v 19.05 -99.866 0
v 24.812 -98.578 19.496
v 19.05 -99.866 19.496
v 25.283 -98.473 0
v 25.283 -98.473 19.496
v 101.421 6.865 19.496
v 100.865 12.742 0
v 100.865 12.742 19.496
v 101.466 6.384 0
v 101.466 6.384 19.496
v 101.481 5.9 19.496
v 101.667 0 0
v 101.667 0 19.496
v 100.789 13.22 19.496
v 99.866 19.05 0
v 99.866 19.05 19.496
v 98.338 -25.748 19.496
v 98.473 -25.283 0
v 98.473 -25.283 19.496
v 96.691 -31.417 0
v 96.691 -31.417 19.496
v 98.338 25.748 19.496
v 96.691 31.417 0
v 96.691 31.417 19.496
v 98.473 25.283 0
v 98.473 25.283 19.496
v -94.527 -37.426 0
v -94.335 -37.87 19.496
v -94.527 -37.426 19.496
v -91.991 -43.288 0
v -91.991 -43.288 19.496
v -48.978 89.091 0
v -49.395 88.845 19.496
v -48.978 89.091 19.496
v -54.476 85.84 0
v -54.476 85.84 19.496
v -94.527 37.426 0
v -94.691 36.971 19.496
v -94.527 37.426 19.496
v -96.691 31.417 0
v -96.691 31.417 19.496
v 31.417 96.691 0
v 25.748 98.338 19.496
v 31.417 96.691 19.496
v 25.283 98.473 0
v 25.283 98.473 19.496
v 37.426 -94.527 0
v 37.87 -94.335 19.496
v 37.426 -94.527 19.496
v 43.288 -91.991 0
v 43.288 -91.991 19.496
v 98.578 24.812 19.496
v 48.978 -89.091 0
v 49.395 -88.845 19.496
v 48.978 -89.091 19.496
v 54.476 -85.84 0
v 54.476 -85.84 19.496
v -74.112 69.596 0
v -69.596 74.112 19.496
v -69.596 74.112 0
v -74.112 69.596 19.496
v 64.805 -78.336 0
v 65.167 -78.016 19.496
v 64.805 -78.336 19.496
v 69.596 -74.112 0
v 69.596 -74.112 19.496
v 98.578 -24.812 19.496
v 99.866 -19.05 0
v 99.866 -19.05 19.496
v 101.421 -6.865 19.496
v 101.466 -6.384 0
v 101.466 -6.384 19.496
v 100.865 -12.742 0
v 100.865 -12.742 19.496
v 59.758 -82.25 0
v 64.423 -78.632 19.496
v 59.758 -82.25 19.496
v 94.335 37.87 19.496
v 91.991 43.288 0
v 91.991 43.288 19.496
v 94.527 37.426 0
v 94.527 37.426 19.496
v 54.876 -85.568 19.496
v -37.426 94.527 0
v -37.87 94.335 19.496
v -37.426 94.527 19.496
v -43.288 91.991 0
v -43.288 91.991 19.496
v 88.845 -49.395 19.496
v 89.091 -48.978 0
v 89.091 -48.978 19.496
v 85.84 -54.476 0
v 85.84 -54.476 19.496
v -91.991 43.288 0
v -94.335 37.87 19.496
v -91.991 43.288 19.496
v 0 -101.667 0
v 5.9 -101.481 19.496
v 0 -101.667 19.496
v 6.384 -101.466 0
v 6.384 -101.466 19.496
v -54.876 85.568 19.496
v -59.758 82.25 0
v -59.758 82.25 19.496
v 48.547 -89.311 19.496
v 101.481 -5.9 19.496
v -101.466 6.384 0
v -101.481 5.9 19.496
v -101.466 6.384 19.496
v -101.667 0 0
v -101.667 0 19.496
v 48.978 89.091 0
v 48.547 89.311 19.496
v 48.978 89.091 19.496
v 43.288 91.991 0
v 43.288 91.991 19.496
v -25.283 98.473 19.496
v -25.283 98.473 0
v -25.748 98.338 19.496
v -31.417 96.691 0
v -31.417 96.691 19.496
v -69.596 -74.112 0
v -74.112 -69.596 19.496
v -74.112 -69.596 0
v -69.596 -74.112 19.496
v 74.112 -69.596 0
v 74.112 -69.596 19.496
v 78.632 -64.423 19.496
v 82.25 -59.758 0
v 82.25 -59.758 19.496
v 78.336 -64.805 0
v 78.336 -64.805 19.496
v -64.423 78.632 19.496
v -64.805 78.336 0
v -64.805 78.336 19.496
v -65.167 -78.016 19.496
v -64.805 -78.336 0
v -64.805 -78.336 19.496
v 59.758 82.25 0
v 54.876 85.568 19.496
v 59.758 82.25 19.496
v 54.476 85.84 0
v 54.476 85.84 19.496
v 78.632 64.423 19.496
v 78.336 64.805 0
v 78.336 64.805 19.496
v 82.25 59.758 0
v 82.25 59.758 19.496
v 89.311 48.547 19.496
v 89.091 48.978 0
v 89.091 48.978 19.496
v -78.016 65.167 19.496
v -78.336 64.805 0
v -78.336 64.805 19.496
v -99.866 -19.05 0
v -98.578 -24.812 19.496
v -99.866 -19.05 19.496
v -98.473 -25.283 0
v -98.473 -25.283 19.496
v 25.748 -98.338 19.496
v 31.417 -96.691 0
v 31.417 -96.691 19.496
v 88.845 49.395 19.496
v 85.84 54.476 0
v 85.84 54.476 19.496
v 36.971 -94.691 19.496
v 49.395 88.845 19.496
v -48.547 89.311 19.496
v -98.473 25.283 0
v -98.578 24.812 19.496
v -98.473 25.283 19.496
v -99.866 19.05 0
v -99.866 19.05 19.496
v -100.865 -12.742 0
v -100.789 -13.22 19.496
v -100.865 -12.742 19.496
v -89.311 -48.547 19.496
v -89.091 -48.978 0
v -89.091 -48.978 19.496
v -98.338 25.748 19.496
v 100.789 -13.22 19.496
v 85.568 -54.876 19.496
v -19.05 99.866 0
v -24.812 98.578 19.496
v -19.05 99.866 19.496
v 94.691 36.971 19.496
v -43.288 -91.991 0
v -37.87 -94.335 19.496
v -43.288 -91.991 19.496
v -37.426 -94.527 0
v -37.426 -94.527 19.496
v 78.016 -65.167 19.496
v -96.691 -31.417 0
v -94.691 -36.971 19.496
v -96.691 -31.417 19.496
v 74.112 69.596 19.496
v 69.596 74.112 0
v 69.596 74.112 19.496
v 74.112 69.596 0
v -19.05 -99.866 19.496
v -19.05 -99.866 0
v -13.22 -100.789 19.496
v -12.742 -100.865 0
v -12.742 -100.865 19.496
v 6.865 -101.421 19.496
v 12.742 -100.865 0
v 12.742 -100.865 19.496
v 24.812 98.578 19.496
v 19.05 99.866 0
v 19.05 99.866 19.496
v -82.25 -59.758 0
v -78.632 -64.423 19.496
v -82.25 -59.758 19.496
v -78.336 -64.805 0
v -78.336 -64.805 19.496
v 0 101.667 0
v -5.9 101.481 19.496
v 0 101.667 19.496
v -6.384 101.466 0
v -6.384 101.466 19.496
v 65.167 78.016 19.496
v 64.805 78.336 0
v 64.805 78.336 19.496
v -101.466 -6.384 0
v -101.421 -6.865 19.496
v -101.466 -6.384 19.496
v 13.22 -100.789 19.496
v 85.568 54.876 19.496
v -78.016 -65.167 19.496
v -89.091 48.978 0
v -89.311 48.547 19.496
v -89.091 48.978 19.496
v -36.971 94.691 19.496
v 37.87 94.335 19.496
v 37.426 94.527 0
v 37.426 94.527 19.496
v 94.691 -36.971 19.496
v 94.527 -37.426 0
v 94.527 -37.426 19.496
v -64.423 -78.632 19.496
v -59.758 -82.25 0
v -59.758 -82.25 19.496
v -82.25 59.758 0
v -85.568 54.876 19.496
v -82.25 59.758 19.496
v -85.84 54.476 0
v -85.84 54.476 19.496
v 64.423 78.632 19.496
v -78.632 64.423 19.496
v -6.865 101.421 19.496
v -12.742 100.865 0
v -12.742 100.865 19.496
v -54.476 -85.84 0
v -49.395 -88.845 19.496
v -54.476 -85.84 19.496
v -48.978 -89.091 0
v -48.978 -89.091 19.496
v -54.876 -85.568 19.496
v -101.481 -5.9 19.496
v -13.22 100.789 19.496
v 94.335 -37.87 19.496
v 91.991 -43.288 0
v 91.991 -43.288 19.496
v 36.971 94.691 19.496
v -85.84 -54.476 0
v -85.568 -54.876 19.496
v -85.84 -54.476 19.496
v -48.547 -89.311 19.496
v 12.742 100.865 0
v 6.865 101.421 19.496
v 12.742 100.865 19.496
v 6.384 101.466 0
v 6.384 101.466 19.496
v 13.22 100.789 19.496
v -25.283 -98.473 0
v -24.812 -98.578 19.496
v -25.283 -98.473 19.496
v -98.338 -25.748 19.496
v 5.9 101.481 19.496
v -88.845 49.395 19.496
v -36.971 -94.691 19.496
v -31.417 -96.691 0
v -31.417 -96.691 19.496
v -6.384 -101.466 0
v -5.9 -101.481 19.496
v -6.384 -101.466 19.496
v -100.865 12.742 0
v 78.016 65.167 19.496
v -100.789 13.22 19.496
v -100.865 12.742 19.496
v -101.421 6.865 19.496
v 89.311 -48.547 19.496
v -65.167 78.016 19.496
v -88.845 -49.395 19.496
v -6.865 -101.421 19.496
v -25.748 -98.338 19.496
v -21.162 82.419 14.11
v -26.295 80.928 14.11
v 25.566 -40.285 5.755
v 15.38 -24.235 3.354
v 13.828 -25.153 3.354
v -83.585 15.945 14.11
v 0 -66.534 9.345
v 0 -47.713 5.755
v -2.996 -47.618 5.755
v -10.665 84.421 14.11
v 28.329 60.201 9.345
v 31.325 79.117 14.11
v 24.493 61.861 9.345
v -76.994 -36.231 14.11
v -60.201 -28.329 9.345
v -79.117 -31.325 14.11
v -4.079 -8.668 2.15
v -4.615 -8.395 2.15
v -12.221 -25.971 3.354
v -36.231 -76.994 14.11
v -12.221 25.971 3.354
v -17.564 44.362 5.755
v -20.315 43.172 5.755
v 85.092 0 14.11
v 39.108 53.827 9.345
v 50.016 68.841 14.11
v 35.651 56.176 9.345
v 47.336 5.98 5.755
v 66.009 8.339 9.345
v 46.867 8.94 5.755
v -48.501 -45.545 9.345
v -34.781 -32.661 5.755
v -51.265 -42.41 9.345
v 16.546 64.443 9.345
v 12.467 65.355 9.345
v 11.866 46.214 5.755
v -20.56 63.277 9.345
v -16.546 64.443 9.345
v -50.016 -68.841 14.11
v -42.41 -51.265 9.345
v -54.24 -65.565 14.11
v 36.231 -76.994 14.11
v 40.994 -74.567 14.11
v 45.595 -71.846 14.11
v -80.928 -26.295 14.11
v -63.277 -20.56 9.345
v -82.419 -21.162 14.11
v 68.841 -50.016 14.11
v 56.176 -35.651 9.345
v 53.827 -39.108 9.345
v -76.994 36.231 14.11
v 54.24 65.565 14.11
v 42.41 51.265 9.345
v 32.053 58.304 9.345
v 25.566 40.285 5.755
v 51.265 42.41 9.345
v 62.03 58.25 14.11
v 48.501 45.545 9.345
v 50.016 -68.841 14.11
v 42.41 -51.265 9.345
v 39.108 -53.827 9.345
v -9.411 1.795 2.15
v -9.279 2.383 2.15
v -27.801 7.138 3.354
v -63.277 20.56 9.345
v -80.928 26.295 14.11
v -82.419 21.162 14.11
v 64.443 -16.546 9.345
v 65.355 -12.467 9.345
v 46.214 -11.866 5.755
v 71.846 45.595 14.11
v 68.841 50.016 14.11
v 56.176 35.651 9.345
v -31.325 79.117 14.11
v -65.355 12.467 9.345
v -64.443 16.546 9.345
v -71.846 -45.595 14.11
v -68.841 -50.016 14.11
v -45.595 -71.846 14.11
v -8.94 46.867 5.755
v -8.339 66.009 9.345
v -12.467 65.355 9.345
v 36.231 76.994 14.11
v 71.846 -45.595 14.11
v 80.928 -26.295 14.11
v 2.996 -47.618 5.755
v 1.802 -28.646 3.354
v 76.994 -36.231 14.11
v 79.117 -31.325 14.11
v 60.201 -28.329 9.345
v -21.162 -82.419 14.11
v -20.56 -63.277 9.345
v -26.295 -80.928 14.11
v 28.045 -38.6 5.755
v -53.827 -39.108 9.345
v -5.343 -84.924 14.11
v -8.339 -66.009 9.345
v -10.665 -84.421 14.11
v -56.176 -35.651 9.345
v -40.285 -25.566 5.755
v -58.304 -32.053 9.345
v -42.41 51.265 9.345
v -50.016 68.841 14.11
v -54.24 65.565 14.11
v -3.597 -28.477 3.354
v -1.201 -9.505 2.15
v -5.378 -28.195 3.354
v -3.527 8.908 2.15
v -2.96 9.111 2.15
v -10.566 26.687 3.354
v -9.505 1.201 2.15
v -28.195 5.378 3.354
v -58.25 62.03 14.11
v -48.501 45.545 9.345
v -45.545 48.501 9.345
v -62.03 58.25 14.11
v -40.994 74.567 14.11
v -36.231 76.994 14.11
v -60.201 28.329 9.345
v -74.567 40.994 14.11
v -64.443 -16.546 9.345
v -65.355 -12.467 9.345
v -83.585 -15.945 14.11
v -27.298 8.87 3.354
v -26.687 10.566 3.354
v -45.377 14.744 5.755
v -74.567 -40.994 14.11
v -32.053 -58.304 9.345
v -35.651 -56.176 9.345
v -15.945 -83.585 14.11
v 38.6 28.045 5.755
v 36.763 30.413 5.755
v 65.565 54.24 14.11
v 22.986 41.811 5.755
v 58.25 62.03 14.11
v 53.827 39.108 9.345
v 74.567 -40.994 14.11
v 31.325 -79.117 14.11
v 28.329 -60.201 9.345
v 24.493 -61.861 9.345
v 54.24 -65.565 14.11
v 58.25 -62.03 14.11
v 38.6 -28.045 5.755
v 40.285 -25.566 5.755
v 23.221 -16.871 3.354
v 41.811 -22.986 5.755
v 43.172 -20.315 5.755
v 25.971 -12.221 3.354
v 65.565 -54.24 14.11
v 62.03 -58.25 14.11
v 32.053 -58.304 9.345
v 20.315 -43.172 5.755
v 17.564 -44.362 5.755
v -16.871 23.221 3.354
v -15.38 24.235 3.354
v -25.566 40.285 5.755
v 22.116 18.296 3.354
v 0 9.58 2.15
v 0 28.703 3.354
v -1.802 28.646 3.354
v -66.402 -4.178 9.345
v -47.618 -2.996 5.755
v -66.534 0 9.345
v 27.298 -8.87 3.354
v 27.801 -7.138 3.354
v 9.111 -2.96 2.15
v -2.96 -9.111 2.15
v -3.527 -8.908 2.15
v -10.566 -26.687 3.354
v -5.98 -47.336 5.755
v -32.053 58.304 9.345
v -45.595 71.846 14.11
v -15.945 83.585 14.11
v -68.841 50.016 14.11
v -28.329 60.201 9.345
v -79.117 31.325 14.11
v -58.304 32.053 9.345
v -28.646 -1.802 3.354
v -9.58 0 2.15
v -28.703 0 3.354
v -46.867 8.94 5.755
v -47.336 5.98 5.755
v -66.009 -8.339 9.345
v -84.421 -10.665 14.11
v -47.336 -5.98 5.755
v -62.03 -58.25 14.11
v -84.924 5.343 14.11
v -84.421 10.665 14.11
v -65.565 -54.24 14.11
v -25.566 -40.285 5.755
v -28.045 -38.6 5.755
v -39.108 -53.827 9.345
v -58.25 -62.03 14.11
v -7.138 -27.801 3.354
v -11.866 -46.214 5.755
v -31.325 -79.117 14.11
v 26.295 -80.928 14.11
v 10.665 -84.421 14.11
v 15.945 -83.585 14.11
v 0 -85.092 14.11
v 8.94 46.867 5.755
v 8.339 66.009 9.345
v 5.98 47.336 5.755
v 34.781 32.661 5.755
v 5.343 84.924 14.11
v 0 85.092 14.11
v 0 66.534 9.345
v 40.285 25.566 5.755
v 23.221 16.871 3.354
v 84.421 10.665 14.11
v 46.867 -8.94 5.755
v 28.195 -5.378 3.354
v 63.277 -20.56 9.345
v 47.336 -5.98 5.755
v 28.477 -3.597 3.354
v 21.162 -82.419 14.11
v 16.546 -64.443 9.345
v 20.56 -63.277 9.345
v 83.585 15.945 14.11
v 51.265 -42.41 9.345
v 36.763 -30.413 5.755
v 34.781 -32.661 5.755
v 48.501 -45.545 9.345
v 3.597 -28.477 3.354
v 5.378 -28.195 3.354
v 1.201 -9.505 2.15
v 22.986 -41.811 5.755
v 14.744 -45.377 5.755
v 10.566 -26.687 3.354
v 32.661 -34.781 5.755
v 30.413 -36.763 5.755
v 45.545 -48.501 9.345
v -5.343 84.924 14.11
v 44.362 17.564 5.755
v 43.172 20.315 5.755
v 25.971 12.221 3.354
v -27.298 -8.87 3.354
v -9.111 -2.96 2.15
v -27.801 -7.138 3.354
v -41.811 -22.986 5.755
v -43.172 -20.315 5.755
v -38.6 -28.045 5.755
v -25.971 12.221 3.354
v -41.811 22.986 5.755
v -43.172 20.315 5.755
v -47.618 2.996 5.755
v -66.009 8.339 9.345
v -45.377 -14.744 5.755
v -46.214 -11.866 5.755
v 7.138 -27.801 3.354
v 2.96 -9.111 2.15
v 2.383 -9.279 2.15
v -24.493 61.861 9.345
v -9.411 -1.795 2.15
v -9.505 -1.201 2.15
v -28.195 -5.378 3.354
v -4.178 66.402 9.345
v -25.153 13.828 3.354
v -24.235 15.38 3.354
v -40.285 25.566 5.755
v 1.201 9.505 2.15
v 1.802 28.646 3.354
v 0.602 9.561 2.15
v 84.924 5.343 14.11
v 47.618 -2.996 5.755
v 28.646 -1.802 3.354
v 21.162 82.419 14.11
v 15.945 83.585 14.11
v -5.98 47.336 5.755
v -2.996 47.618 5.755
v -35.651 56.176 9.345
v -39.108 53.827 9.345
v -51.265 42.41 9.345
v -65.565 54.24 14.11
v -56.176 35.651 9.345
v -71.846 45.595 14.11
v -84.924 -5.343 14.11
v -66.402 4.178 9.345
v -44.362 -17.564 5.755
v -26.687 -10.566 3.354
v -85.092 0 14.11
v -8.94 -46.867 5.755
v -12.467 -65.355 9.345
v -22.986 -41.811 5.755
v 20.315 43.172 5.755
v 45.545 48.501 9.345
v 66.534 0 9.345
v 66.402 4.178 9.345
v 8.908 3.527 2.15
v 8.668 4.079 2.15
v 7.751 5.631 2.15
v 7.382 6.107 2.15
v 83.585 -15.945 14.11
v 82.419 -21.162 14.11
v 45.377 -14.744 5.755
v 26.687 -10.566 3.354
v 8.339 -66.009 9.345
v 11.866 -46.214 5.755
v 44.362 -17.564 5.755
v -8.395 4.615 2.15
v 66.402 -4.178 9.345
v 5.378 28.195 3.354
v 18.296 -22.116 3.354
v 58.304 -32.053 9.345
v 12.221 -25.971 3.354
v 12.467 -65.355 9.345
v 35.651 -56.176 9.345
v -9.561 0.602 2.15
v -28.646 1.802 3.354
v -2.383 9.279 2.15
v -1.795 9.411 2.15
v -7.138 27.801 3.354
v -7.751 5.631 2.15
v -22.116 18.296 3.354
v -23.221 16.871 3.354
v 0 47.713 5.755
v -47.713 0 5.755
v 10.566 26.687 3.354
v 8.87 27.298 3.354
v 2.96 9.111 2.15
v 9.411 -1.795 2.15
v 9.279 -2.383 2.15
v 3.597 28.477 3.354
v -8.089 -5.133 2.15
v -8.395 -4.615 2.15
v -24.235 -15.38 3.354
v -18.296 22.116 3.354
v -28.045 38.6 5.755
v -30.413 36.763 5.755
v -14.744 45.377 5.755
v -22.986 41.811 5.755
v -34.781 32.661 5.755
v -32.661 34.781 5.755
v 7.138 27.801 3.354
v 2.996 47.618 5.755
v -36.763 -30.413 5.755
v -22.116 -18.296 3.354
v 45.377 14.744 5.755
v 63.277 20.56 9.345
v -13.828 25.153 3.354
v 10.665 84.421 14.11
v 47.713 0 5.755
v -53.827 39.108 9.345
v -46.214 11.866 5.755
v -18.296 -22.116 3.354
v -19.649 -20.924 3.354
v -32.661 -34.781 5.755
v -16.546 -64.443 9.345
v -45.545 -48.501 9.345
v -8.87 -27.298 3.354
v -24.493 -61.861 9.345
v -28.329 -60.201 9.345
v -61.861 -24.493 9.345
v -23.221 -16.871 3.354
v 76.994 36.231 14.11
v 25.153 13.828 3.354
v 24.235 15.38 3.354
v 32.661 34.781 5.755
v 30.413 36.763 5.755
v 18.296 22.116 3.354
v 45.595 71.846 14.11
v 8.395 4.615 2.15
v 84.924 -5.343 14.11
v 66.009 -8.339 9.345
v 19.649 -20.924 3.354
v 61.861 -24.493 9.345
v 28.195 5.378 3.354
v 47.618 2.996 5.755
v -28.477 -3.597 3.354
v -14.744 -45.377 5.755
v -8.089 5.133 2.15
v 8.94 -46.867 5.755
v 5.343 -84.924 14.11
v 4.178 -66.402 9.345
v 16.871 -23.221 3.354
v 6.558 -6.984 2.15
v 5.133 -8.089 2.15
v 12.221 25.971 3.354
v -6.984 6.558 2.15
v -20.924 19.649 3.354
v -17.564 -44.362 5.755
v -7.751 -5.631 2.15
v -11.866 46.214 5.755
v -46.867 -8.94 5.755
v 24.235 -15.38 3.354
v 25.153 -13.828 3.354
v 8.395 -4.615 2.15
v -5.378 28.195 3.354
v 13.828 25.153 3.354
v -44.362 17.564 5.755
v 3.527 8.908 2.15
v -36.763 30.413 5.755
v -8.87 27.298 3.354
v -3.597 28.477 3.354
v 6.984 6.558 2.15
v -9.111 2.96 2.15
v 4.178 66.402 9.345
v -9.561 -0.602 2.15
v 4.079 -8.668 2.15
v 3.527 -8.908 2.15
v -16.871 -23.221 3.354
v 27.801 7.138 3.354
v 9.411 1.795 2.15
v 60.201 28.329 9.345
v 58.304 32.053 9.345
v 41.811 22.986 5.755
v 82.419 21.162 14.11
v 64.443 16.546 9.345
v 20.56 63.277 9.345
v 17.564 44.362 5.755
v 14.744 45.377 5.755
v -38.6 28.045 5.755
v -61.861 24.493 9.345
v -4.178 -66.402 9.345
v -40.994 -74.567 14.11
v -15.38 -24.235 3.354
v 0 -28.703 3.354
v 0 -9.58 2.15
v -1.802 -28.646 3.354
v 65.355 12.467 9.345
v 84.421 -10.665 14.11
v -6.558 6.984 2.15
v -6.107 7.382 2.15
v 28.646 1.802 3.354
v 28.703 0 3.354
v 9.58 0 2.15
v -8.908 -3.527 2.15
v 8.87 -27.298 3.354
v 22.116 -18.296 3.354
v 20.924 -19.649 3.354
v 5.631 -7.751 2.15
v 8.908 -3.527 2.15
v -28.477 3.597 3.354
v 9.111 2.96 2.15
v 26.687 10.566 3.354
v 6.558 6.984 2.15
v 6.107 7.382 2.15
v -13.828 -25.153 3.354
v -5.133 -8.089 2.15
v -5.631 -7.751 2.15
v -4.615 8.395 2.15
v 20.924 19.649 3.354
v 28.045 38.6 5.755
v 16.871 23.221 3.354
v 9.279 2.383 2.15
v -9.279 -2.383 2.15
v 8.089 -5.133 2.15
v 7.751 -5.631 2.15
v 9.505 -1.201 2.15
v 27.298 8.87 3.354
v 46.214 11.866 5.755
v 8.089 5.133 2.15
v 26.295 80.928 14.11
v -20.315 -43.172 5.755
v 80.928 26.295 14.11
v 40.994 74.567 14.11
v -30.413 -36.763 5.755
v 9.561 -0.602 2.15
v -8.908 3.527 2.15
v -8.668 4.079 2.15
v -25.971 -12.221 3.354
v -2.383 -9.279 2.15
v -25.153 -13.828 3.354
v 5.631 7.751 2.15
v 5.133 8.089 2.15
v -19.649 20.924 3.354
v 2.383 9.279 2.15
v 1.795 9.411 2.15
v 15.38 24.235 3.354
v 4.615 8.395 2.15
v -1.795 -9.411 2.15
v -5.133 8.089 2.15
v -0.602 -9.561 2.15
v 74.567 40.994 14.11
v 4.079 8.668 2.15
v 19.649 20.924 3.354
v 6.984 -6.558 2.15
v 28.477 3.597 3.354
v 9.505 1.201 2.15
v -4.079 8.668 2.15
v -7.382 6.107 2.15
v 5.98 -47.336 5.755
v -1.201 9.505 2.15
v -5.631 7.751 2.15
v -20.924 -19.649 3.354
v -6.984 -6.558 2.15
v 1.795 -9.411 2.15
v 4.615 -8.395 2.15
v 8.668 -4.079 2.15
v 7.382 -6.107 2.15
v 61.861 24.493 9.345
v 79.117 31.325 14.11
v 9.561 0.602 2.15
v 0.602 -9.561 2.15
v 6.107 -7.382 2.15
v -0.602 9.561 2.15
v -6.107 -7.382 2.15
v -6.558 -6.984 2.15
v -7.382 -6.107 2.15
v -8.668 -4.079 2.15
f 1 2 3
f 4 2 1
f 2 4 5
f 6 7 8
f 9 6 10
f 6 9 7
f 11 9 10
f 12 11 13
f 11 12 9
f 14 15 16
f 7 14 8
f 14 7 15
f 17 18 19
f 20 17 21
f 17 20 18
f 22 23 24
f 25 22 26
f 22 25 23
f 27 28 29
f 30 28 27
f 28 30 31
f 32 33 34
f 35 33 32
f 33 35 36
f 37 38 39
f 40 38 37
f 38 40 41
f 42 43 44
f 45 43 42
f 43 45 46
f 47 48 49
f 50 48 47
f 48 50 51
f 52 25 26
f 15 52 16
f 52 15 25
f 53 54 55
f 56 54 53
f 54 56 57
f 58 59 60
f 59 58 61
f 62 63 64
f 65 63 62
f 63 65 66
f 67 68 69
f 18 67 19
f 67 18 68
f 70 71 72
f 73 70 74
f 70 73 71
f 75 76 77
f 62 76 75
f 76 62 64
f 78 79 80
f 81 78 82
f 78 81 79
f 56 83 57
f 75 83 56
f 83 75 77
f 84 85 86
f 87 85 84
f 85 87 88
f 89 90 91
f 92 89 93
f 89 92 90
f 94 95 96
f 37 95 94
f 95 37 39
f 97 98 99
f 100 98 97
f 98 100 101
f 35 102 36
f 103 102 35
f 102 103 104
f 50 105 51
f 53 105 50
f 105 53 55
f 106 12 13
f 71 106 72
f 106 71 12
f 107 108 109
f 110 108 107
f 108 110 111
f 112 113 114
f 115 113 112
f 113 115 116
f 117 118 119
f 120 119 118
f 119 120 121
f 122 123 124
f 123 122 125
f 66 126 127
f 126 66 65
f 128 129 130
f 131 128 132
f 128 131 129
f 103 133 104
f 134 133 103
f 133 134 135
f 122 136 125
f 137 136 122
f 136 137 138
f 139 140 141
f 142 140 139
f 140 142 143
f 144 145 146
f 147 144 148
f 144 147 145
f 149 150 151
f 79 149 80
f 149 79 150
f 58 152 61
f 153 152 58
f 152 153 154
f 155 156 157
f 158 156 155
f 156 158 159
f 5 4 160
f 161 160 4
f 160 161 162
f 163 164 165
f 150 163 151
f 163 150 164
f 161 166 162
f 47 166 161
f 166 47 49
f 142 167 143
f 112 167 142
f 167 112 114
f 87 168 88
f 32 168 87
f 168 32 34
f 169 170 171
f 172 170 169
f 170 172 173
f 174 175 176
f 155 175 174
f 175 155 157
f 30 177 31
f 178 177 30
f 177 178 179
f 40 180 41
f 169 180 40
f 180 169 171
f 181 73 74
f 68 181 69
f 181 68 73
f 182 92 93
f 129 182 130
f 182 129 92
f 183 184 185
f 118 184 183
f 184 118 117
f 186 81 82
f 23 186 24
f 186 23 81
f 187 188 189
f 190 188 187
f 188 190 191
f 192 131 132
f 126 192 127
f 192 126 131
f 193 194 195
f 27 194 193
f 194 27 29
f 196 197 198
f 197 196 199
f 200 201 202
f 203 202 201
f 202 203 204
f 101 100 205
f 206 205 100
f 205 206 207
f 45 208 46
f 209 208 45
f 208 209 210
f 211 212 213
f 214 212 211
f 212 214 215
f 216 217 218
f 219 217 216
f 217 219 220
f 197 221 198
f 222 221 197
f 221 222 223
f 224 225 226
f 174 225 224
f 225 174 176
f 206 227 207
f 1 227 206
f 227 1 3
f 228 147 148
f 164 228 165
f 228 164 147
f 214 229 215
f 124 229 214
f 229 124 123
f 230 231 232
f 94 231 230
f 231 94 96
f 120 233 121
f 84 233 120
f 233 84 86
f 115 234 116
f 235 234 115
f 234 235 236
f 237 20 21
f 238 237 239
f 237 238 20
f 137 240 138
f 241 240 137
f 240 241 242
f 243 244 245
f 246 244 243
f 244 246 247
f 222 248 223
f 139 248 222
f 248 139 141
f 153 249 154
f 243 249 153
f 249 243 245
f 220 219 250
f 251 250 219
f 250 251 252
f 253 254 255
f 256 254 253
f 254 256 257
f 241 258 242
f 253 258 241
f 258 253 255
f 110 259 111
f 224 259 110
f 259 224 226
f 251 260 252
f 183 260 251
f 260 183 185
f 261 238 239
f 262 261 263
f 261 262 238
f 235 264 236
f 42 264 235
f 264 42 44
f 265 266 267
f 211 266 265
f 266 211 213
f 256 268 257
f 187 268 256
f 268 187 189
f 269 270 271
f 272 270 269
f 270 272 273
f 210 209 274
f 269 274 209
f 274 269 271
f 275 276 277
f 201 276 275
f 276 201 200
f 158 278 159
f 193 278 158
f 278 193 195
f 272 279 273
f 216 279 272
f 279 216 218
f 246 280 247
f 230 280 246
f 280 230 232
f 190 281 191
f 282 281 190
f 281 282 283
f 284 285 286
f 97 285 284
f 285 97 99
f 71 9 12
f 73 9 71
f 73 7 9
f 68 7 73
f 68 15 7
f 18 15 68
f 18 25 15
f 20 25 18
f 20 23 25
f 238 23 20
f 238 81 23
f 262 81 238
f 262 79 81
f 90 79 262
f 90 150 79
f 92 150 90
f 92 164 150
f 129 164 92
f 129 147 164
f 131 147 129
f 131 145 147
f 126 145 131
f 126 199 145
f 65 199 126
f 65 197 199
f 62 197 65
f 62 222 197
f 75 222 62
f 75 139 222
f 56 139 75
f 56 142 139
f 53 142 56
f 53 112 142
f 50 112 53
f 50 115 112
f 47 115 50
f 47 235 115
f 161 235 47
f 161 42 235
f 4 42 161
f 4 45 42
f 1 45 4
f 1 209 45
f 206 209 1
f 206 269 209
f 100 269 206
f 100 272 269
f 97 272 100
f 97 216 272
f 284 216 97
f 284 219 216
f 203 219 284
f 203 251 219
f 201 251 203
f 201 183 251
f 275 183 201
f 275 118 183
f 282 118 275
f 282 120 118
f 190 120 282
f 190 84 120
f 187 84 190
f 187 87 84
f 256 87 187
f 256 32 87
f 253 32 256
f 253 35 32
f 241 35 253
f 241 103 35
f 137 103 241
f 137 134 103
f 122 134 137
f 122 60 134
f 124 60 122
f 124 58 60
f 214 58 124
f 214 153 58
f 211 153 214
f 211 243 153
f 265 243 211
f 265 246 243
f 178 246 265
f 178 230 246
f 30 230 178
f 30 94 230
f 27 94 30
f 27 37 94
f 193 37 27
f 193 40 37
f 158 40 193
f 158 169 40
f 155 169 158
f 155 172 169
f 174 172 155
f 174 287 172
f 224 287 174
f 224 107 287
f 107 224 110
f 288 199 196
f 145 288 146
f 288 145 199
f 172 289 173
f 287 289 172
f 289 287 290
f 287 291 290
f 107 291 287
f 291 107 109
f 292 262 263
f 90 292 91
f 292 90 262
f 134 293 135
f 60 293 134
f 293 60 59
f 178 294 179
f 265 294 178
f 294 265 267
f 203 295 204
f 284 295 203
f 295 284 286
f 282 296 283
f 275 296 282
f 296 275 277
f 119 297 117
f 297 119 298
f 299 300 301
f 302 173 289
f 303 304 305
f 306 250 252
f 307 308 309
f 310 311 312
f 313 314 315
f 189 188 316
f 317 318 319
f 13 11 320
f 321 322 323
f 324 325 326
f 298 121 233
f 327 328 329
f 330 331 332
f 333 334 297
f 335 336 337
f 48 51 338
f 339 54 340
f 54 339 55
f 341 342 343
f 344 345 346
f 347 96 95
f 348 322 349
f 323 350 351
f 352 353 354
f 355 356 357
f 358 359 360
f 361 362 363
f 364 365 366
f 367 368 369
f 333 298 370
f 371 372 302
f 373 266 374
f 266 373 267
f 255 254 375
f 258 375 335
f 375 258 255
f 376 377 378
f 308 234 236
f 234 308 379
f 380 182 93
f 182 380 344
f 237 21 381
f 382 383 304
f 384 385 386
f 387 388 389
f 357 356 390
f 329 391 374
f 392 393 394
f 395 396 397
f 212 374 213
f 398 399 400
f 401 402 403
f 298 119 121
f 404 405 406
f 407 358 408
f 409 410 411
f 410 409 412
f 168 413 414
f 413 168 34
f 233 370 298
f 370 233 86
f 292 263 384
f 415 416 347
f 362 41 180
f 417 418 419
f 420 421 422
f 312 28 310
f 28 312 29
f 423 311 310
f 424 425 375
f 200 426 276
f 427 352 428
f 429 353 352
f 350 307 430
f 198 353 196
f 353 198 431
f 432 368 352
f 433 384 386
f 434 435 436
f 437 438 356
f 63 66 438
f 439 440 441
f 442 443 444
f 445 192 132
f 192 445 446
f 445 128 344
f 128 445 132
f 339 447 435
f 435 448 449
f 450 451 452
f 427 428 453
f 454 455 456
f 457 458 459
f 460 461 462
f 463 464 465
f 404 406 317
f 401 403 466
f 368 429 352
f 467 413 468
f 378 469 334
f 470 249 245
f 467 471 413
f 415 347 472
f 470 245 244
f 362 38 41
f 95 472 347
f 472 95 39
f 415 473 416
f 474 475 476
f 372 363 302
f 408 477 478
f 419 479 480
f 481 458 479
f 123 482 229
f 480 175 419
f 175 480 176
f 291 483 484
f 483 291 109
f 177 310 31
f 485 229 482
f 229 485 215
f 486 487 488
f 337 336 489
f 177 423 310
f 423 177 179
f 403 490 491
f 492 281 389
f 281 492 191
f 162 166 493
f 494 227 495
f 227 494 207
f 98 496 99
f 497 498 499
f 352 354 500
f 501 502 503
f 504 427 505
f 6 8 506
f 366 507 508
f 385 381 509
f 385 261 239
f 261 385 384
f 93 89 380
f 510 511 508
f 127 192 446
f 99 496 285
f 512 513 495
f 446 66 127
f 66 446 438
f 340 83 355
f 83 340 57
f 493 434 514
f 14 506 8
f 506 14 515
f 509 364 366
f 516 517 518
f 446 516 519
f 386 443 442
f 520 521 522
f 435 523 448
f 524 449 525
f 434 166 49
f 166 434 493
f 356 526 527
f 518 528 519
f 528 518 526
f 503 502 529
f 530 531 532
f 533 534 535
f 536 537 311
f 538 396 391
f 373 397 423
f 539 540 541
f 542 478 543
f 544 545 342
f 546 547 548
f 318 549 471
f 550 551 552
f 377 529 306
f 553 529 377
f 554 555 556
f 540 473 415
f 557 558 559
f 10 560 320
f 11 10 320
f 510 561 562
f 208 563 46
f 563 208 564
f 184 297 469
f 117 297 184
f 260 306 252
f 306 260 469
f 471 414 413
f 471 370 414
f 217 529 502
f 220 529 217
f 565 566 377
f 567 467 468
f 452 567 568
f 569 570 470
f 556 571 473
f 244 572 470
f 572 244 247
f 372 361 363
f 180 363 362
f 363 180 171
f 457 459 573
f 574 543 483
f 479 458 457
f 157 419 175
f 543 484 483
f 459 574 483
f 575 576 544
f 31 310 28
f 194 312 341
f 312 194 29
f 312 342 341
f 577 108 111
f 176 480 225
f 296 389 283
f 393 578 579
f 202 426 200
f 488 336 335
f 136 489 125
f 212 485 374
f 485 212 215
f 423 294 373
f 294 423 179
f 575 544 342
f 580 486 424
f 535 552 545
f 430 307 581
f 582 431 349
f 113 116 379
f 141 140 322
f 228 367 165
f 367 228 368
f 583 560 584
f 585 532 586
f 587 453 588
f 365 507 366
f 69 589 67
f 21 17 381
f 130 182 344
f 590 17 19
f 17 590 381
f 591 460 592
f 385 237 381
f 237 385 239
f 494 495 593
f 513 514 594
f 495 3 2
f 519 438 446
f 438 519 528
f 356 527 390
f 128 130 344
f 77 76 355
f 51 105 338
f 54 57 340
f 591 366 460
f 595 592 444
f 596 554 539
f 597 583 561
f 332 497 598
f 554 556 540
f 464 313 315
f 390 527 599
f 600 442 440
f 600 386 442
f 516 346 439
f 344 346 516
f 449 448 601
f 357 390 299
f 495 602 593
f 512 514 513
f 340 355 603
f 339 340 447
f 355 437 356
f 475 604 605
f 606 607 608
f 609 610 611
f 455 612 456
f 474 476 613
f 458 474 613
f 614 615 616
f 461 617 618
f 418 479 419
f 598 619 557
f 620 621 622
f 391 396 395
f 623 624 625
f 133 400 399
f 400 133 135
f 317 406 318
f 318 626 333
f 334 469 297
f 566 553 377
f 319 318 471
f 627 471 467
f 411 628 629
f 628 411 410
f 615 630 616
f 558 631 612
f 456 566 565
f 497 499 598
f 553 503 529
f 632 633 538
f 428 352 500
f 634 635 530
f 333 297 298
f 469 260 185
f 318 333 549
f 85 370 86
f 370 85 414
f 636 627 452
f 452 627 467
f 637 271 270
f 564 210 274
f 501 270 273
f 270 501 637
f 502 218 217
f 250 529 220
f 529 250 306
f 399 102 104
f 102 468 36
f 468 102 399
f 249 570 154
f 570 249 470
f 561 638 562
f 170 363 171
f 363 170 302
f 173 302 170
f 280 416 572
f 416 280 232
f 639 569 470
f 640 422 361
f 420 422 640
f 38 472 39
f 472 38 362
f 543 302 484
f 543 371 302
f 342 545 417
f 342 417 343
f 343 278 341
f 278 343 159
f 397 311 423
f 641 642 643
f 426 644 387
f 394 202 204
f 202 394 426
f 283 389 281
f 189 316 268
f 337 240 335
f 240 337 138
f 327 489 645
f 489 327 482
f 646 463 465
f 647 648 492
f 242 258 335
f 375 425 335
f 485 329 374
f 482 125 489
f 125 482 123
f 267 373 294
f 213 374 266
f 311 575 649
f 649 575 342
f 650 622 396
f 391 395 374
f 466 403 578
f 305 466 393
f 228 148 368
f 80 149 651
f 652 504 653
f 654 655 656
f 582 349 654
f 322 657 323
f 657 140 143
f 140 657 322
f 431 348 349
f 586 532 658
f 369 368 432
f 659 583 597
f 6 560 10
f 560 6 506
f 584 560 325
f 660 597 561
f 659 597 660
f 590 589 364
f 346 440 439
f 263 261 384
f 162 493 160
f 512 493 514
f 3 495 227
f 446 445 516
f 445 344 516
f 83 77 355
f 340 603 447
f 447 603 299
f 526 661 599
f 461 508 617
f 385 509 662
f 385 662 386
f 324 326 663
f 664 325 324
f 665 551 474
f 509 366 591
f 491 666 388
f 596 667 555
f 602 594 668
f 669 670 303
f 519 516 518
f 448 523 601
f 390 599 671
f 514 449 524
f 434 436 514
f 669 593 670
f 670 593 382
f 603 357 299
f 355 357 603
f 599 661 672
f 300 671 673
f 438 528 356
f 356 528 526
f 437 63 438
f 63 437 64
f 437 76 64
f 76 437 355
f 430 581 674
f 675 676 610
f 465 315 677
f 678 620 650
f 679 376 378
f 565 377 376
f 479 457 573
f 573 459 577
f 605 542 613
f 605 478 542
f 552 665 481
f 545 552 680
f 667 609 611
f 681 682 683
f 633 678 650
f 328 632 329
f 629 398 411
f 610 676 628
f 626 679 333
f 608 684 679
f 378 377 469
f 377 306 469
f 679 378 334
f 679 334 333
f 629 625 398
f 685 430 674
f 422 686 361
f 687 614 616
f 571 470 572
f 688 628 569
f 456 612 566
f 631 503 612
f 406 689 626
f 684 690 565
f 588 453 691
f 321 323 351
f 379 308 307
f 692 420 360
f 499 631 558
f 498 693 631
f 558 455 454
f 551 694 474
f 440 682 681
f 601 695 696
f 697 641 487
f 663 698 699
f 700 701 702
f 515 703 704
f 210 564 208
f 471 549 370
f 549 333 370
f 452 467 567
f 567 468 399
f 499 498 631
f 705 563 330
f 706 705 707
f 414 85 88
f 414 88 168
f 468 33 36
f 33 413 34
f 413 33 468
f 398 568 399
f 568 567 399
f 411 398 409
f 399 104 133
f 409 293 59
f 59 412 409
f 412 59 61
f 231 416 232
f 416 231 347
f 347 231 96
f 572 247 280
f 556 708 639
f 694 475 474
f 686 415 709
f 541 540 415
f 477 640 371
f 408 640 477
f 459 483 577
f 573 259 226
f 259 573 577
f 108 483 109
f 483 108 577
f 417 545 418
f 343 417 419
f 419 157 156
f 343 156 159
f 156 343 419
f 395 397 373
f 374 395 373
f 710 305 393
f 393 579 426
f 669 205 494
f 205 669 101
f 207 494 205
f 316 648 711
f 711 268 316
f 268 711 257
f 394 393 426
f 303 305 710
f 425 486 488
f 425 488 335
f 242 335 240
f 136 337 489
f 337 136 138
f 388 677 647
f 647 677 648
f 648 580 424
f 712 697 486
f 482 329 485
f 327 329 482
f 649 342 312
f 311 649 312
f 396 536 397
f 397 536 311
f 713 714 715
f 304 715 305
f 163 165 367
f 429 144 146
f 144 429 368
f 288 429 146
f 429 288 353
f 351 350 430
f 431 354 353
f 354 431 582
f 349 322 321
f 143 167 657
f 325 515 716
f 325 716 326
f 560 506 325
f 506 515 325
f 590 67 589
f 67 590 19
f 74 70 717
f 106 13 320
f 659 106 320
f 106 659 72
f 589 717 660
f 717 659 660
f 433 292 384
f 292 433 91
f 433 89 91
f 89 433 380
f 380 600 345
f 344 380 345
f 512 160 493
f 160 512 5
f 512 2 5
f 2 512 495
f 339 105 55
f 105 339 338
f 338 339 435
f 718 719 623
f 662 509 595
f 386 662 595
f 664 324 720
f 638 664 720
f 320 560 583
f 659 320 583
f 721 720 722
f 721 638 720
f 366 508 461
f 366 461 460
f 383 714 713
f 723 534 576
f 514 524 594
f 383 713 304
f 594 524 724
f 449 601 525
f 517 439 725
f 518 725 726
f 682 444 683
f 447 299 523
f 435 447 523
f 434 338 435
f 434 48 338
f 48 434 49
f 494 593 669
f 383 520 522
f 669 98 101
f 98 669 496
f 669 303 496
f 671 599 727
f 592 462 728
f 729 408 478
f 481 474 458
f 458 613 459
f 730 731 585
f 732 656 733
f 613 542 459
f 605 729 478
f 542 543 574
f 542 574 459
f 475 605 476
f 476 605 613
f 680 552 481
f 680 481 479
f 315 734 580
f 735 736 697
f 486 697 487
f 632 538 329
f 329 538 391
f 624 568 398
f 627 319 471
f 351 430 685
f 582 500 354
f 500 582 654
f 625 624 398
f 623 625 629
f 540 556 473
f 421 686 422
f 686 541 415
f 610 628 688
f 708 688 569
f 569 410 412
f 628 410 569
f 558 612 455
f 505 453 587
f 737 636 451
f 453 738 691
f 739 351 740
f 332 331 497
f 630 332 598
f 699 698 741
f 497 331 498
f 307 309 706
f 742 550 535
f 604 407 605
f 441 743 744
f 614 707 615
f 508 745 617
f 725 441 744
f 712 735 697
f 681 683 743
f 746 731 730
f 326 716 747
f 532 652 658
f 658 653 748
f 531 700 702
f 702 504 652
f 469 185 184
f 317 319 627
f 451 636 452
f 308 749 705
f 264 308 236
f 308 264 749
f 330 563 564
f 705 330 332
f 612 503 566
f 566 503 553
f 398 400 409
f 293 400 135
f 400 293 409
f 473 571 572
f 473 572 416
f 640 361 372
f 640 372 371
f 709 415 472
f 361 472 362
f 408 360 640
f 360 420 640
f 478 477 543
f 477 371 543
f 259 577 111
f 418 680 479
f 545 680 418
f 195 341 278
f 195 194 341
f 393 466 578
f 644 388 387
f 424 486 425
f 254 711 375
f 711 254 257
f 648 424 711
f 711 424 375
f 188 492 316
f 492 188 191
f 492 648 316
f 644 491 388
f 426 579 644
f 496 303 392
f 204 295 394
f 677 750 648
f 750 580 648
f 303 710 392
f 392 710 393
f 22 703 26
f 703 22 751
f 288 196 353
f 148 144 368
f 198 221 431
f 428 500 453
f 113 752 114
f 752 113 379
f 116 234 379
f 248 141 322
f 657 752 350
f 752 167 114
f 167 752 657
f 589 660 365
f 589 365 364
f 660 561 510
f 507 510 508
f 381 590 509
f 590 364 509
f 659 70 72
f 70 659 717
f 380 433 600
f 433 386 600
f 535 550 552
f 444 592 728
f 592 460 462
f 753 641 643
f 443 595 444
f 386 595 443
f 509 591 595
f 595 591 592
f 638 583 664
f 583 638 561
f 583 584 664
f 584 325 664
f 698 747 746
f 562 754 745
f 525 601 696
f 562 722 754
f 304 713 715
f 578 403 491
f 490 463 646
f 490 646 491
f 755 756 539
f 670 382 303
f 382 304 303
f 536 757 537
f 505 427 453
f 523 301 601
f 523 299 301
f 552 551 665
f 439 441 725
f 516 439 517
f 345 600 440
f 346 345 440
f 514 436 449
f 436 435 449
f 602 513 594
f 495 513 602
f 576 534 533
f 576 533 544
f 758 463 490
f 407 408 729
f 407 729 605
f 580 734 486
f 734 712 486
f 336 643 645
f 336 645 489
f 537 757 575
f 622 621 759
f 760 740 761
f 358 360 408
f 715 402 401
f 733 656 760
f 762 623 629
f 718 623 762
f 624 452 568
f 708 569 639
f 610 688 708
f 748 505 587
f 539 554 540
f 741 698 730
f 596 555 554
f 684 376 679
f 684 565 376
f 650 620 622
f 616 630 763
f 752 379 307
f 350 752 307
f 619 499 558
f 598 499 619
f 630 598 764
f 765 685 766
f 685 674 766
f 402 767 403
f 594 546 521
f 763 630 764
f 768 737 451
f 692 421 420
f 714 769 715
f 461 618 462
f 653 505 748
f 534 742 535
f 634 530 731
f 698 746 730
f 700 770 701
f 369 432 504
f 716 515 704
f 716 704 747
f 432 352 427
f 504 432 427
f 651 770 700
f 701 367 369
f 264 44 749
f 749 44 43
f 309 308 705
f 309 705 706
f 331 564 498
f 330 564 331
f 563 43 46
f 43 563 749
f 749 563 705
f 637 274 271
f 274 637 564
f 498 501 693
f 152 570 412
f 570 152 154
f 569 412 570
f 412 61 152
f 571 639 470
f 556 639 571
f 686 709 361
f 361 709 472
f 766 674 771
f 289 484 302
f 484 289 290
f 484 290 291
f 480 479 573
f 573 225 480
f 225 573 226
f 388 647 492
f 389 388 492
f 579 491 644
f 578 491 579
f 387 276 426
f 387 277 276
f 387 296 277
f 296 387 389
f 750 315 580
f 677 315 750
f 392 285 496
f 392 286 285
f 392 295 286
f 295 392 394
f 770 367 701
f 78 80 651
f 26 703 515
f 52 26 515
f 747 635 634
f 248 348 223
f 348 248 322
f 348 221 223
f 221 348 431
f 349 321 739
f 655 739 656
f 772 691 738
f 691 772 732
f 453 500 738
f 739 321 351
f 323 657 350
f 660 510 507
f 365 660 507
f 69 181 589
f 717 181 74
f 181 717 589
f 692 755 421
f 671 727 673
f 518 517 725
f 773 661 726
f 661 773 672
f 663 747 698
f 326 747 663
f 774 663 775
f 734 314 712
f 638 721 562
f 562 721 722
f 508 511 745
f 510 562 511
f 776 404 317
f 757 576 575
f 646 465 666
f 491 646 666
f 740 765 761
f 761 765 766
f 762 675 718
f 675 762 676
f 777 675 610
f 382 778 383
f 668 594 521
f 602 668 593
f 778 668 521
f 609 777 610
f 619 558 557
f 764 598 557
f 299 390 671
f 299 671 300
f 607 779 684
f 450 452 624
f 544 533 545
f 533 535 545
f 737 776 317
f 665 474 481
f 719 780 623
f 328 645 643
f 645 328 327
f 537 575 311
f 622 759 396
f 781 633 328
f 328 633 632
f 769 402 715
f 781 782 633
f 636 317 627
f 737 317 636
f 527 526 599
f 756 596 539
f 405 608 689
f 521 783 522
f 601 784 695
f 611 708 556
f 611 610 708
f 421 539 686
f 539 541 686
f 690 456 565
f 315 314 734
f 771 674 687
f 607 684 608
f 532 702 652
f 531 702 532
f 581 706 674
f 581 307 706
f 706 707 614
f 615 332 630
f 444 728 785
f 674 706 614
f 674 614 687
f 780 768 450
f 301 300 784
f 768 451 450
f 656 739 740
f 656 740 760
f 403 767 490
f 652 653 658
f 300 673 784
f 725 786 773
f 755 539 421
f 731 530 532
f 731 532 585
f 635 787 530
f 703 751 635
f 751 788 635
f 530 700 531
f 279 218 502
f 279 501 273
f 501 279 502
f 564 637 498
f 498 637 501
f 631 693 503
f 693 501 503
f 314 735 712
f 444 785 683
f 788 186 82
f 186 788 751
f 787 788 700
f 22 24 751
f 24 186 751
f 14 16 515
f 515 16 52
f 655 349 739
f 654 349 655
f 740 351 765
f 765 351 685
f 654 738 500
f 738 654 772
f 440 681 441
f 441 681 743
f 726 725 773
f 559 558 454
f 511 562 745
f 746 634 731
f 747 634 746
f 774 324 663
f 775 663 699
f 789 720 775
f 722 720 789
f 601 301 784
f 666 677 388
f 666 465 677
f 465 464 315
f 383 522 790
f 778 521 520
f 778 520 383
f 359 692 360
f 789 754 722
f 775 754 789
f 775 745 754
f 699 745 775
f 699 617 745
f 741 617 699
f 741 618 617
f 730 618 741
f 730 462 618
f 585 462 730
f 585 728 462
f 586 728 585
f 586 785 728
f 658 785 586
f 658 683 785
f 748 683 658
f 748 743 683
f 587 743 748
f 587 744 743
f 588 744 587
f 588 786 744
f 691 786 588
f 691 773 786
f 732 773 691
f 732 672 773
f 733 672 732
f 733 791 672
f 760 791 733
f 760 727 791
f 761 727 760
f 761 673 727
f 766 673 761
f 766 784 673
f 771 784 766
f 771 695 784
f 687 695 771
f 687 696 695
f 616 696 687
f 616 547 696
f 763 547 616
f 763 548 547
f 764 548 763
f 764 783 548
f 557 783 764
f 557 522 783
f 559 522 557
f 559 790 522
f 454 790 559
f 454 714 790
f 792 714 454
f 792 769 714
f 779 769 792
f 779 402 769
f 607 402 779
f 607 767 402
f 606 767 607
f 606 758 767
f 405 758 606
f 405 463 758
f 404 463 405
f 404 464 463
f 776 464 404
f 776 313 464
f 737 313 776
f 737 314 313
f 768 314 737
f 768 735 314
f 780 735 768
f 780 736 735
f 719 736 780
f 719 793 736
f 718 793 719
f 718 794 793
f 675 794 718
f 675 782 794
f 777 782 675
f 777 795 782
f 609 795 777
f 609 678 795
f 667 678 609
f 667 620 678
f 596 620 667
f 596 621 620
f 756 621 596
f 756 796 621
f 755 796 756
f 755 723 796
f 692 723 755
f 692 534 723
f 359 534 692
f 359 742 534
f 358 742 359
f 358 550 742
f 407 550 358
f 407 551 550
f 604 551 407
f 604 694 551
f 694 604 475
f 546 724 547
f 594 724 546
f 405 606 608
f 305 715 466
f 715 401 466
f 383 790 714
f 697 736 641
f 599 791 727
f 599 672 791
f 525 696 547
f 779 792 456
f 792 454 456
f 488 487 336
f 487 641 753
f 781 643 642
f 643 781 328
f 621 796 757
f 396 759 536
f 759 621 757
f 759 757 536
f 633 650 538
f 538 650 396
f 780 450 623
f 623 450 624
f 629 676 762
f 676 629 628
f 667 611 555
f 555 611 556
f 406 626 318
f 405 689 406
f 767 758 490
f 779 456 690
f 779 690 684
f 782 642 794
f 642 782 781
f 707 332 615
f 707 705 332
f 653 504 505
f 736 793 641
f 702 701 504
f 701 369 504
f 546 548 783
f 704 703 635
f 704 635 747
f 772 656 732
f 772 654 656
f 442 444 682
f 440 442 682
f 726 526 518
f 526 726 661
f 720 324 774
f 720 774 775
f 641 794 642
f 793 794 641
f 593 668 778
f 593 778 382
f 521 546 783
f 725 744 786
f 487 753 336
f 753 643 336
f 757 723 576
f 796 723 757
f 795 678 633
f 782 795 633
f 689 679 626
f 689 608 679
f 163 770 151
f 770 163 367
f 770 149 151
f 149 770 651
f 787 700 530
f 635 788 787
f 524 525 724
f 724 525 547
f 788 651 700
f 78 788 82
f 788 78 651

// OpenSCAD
ball_radius=610/2;  // [mm]

module theBall()
{
  translate([0, 0, ball_radius+2])
    sphere(r=ball_radius, $fn=100);
}

difference()
{
  cylinder(r=ball_radius/3, h=20, $fn=100);
  #theBall();
}
